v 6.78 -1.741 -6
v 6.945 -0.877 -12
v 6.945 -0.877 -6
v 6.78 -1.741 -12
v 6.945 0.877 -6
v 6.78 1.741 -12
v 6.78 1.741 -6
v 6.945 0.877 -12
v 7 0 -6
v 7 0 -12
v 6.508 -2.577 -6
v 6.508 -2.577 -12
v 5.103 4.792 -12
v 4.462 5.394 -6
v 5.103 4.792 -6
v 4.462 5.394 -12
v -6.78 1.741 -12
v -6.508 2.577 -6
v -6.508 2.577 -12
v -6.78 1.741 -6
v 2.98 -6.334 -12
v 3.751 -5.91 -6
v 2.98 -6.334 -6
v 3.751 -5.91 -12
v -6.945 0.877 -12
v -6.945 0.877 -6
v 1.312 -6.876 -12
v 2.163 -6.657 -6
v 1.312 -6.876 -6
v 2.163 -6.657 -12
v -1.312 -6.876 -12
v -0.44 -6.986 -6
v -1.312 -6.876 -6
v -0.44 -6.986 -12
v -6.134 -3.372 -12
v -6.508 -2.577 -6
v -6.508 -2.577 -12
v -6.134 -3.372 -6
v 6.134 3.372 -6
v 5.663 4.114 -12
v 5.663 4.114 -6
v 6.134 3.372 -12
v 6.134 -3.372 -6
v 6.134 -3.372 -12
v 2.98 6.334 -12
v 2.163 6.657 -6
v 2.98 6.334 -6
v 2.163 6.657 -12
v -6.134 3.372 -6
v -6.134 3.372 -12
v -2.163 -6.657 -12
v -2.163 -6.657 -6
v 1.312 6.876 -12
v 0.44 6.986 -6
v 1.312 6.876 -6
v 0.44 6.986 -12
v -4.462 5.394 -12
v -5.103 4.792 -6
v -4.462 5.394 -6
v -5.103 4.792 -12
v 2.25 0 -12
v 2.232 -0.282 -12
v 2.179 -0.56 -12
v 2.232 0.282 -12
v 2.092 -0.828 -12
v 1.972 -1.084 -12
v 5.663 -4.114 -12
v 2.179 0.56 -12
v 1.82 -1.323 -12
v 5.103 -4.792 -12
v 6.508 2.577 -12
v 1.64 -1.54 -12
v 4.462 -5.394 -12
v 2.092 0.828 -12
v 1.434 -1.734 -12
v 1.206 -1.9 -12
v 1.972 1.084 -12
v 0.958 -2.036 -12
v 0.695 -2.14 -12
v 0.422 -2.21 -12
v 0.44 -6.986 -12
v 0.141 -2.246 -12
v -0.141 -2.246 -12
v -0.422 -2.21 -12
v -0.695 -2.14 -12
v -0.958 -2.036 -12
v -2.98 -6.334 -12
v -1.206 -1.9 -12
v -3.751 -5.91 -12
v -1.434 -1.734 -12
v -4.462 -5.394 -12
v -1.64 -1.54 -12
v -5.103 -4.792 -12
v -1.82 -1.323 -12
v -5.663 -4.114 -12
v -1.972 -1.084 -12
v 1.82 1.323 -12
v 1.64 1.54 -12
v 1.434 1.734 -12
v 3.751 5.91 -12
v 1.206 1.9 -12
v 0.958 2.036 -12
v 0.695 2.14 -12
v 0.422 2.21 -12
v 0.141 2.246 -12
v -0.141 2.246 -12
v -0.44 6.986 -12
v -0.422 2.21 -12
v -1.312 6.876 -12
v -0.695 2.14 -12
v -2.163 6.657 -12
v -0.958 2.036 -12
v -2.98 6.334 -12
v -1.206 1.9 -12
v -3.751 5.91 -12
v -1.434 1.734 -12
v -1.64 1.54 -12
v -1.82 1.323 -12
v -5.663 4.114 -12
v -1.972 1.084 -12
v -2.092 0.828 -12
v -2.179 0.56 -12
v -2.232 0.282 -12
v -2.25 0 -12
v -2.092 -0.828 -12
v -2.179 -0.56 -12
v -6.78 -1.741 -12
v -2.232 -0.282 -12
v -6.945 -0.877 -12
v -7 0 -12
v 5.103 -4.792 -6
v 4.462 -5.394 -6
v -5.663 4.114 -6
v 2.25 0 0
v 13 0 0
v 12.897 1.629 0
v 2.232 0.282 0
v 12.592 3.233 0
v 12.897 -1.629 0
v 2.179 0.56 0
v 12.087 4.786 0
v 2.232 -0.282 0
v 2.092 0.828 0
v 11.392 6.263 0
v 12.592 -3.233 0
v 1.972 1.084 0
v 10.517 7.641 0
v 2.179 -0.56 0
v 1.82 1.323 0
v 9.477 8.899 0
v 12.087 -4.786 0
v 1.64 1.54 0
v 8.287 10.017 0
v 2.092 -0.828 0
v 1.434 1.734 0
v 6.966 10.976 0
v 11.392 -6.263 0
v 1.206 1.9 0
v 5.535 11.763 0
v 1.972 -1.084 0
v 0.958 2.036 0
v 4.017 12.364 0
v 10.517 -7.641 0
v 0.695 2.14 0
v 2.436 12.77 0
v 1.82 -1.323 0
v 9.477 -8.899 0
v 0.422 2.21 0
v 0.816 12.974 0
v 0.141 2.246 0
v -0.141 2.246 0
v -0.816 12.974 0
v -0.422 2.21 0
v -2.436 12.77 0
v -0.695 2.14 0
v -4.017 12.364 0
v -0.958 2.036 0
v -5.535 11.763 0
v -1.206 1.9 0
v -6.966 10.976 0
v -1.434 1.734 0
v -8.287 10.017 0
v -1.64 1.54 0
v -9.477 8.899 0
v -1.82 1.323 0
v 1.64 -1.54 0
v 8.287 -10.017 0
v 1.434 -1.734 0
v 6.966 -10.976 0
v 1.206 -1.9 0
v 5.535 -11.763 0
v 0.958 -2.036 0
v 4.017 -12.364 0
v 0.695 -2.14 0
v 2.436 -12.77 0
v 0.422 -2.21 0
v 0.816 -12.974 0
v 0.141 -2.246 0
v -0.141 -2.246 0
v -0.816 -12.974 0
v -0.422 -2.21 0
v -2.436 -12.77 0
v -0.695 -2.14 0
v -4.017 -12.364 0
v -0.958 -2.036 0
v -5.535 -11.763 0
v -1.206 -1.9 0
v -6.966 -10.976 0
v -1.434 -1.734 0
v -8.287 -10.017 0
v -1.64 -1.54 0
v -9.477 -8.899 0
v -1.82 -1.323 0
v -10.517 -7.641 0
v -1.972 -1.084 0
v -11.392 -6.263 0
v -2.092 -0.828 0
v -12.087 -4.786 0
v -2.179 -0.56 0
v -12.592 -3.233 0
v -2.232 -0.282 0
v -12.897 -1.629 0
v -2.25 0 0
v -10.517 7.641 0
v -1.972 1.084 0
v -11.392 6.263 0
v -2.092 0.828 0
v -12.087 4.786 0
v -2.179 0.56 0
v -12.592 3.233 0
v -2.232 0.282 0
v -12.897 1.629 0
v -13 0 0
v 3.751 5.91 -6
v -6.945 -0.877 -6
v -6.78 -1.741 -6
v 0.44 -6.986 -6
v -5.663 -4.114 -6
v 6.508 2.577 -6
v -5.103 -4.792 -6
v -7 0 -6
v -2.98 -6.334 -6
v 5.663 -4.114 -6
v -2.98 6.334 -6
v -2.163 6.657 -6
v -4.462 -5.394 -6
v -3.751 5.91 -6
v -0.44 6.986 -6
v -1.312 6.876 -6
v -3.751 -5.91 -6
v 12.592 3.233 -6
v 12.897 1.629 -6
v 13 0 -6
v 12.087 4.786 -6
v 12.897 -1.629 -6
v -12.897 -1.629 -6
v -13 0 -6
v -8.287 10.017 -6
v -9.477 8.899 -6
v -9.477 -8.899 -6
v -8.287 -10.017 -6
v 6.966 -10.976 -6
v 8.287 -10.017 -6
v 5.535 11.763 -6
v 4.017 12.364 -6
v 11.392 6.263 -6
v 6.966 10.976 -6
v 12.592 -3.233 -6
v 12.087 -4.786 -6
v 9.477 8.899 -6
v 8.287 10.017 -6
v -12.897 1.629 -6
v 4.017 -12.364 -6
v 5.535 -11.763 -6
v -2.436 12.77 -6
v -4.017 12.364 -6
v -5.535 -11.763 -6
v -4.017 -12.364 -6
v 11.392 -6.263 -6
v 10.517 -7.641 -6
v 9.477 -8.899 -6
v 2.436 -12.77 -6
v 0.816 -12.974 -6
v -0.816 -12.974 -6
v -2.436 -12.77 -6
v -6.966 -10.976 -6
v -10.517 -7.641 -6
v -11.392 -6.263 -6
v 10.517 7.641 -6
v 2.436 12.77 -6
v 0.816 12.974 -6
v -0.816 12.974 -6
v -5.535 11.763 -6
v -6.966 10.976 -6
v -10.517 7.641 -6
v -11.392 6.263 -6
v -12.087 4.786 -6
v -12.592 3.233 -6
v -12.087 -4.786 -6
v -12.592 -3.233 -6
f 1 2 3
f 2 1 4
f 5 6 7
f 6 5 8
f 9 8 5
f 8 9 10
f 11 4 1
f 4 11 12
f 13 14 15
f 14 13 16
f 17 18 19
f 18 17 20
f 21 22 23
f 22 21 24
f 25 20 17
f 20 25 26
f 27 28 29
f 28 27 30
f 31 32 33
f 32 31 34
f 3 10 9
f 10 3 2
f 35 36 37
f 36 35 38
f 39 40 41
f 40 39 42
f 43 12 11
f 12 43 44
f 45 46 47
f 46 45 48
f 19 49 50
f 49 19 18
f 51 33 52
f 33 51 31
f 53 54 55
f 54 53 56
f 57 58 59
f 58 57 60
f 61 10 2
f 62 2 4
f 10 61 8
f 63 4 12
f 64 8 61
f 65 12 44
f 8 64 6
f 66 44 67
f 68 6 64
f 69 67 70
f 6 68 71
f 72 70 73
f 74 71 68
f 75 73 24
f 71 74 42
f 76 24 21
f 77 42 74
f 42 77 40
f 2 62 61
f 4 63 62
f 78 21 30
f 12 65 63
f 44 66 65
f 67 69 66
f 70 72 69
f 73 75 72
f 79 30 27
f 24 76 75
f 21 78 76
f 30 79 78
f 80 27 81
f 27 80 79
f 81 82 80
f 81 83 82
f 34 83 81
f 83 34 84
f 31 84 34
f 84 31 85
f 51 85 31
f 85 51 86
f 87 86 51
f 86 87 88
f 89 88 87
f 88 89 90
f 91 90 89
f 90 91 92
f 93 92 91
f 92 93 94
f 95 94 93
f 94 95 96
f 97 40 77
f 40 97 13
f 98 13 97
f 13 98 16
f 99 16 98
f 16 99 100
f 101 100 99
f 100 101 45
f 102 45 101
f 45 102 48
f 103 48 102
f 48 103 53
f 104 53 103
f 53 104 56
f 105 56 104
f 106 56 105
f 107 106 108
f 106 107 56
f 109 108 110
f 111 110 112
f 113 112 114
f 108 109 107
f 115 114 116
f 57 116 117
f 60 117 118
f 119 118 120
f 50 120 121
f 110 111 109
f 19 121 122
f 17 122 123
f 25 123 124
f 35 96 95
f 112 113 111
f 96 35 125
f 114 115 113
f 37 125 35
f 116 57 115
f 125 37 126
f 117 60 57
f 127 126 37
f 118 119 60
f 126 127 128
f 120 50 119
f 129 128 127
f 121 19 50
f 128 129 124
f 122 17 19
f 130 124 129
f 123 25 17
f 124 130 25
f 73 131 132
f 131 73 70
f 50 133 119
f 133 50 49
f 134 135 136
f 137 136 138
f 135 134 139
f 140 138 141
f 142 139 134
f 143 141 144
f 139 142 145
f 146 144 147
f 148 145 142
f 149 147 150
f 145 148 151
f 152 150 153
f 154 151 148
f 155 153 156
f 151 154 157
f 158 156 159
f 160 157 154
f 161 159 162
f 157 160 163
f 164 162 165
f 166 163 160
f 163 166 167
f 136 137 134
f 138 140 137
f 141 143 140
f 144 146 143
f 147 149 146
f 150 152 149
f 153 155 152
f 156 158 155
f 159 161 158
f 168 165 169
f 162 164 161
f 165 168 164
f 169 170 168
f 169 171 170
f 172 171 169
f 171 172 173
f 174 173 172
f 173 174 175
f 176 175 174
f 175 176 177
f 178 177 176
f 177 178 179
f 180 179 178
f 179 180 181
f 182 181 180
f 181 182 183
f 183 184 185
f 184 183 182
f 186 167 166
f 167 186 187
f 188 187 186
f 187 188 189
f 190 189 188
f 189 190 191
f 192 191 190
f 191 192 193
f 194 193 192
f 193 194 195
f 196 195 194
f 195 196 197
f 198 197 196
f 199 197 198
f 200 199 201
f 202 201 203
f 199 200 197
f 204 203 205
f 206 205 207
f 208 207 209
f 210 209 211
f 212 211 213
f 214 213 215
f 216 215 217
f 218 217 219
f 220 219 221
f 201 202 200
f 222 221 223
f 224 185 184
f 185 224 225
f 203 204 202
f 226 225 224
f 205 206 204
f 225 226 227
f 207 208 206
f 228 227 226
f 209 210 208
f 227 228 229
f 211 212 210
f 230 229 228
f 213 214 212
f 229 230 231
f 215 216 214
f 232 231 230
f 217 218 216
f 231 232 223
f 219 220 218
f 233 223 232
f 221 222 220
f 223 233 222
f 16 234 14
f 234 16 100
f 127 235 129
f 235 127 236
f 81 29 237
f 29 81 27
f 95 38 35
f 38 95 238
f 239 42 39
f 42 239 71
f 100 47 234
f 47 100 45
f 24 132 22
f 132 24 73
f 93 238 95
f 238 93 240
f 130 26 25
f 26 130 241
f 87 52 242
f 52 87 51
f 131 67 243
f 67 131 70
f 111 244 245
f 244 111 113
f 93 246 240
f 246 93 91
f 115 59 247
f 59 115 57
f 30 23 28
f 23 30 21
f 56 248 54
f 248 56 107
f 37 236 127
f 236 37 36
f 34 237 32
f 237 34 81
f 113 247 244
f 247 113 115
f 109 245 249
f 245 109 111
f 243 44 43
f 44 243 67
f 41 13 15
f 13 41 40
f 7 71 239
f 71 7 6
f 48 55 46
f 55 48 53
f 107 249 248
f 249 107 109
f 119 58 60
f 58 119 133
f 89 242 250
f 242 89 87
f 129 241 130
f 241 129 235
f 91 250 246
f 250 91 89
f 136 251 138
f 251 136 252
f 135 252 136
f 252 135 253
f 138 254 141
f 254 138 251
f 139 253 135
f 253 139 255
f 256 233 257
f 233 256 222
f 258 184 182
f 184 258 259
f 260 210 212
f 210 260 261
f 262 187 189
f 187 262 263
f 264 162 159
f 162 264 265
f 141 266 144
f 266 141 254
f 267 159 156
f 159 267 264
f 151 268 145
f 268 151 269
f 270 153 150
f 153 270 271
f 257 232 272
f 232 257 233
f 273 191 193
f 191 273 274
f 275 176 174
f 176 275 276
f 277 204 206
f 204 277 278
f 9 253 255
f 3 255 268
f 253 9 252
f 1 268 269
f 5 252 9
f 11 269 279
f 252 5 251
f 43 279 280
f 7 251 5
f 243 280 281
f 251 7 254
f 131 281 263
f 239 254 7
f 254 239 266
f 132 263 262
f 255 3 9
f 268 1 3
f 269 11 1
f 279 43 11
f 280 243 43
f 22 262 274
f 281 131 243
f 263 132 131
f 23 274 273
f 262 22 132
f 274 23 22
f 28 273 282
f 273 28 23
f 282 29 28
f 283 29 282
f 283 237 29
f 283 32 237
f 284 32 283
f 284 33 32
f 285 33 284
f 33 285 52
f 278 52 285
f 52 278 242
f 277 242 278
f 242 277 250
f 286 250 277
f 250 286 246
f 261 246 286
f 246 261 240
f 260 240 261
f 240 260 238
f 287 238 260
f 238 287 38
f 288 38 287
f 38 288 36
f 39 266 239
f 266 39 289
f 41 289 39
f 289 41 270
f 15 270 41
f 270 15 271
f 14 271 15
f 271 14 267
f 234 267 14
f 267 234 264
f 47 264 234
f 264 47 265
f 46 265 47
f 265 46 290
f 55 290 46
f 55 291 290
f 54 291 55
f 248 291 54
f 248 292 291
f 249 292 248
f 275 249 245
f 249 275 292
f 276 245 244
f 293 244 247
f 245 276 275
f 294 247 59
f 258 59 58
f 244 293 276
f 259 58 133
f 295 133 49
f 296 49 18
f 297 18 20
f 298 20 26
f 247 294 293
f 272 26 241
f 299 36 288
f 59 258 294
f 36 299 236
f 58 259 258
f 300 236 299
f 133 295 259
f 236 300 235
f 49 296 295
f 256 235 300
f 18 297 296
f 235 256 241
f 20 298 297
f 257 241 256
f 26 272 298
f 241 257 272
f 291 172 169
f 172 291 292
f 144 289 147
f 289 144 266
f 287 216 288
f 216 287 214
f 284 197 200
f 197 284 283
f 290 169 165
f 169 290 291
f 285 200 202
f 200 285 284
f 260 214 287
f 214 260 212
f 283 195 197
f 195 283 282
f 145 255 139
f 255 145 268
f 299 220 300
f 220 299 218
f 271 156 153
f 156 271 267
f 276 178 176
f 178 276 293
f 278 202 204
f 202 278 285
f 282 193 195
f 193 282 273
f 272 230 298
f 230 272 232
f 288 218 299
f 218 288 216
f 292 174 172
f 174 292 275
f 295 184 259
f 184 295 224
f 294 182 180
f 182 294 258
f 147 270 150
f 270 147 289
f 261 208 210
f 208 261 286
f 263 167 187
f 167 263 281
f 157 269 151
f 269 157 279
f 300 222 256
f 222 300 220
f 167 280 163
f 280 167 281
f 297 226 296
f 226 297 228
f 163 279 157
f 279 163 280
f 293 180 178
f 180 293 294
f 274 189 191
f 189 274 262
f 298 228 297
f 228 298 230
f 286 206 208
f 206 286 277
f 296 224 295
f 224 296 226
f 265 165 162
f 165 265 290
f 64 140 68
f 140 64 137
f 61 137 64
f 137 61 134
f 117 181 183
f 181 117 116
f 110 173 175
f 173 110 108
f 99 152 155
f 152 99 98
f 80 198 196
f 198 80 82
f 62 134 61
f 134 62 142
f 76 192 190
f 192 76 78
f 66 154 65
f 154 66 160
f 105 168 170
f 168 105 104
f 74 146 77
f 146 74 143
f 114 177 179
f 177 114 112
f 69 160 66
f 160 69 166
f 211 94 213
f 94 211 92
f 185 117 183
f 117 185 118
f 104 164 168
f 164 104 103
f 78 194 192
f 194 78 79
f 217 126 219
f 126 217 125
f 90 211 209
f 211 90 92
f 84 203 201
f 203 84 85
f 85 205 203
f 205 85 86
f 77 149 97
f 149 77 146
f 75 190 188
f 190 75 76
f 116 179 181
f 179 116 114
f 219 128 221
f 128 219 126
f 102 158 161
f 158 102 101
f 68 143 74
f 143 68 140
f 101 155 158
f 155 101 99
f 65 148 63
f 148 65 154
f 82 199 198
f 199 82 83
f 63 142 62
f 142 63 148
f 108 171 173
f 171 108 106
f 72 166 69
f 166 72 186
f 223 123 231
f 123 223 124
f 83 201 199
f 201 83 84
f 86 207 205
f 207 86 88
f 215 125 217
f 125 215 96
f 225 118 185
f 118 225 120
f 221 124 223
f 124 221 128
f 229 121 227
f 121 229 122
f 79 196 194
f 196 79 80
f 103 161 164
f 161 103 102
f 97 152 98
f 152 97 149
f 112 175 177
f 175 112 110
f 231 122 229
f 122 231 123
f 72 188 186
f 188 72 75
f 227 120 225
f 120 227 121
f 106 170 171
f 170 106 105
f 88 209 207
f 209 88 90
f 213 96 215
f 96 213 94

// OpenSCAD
$fn = 50;


difference() {
	union() {
		translate(v = [0, 0, -12.0000000000]) {
			cylinder(h = 12, r = 7.0000000000);
		}
		translate(v = [0, 0, -6.0000000000]) {
			cylinder(h = 6, r = 13.0000000000);
		}
	}
	union() {
		#translate(v = [0, 0, -12]) {
			cylinder(h = 12, r = 2.2500000000);
		}
	}
}
